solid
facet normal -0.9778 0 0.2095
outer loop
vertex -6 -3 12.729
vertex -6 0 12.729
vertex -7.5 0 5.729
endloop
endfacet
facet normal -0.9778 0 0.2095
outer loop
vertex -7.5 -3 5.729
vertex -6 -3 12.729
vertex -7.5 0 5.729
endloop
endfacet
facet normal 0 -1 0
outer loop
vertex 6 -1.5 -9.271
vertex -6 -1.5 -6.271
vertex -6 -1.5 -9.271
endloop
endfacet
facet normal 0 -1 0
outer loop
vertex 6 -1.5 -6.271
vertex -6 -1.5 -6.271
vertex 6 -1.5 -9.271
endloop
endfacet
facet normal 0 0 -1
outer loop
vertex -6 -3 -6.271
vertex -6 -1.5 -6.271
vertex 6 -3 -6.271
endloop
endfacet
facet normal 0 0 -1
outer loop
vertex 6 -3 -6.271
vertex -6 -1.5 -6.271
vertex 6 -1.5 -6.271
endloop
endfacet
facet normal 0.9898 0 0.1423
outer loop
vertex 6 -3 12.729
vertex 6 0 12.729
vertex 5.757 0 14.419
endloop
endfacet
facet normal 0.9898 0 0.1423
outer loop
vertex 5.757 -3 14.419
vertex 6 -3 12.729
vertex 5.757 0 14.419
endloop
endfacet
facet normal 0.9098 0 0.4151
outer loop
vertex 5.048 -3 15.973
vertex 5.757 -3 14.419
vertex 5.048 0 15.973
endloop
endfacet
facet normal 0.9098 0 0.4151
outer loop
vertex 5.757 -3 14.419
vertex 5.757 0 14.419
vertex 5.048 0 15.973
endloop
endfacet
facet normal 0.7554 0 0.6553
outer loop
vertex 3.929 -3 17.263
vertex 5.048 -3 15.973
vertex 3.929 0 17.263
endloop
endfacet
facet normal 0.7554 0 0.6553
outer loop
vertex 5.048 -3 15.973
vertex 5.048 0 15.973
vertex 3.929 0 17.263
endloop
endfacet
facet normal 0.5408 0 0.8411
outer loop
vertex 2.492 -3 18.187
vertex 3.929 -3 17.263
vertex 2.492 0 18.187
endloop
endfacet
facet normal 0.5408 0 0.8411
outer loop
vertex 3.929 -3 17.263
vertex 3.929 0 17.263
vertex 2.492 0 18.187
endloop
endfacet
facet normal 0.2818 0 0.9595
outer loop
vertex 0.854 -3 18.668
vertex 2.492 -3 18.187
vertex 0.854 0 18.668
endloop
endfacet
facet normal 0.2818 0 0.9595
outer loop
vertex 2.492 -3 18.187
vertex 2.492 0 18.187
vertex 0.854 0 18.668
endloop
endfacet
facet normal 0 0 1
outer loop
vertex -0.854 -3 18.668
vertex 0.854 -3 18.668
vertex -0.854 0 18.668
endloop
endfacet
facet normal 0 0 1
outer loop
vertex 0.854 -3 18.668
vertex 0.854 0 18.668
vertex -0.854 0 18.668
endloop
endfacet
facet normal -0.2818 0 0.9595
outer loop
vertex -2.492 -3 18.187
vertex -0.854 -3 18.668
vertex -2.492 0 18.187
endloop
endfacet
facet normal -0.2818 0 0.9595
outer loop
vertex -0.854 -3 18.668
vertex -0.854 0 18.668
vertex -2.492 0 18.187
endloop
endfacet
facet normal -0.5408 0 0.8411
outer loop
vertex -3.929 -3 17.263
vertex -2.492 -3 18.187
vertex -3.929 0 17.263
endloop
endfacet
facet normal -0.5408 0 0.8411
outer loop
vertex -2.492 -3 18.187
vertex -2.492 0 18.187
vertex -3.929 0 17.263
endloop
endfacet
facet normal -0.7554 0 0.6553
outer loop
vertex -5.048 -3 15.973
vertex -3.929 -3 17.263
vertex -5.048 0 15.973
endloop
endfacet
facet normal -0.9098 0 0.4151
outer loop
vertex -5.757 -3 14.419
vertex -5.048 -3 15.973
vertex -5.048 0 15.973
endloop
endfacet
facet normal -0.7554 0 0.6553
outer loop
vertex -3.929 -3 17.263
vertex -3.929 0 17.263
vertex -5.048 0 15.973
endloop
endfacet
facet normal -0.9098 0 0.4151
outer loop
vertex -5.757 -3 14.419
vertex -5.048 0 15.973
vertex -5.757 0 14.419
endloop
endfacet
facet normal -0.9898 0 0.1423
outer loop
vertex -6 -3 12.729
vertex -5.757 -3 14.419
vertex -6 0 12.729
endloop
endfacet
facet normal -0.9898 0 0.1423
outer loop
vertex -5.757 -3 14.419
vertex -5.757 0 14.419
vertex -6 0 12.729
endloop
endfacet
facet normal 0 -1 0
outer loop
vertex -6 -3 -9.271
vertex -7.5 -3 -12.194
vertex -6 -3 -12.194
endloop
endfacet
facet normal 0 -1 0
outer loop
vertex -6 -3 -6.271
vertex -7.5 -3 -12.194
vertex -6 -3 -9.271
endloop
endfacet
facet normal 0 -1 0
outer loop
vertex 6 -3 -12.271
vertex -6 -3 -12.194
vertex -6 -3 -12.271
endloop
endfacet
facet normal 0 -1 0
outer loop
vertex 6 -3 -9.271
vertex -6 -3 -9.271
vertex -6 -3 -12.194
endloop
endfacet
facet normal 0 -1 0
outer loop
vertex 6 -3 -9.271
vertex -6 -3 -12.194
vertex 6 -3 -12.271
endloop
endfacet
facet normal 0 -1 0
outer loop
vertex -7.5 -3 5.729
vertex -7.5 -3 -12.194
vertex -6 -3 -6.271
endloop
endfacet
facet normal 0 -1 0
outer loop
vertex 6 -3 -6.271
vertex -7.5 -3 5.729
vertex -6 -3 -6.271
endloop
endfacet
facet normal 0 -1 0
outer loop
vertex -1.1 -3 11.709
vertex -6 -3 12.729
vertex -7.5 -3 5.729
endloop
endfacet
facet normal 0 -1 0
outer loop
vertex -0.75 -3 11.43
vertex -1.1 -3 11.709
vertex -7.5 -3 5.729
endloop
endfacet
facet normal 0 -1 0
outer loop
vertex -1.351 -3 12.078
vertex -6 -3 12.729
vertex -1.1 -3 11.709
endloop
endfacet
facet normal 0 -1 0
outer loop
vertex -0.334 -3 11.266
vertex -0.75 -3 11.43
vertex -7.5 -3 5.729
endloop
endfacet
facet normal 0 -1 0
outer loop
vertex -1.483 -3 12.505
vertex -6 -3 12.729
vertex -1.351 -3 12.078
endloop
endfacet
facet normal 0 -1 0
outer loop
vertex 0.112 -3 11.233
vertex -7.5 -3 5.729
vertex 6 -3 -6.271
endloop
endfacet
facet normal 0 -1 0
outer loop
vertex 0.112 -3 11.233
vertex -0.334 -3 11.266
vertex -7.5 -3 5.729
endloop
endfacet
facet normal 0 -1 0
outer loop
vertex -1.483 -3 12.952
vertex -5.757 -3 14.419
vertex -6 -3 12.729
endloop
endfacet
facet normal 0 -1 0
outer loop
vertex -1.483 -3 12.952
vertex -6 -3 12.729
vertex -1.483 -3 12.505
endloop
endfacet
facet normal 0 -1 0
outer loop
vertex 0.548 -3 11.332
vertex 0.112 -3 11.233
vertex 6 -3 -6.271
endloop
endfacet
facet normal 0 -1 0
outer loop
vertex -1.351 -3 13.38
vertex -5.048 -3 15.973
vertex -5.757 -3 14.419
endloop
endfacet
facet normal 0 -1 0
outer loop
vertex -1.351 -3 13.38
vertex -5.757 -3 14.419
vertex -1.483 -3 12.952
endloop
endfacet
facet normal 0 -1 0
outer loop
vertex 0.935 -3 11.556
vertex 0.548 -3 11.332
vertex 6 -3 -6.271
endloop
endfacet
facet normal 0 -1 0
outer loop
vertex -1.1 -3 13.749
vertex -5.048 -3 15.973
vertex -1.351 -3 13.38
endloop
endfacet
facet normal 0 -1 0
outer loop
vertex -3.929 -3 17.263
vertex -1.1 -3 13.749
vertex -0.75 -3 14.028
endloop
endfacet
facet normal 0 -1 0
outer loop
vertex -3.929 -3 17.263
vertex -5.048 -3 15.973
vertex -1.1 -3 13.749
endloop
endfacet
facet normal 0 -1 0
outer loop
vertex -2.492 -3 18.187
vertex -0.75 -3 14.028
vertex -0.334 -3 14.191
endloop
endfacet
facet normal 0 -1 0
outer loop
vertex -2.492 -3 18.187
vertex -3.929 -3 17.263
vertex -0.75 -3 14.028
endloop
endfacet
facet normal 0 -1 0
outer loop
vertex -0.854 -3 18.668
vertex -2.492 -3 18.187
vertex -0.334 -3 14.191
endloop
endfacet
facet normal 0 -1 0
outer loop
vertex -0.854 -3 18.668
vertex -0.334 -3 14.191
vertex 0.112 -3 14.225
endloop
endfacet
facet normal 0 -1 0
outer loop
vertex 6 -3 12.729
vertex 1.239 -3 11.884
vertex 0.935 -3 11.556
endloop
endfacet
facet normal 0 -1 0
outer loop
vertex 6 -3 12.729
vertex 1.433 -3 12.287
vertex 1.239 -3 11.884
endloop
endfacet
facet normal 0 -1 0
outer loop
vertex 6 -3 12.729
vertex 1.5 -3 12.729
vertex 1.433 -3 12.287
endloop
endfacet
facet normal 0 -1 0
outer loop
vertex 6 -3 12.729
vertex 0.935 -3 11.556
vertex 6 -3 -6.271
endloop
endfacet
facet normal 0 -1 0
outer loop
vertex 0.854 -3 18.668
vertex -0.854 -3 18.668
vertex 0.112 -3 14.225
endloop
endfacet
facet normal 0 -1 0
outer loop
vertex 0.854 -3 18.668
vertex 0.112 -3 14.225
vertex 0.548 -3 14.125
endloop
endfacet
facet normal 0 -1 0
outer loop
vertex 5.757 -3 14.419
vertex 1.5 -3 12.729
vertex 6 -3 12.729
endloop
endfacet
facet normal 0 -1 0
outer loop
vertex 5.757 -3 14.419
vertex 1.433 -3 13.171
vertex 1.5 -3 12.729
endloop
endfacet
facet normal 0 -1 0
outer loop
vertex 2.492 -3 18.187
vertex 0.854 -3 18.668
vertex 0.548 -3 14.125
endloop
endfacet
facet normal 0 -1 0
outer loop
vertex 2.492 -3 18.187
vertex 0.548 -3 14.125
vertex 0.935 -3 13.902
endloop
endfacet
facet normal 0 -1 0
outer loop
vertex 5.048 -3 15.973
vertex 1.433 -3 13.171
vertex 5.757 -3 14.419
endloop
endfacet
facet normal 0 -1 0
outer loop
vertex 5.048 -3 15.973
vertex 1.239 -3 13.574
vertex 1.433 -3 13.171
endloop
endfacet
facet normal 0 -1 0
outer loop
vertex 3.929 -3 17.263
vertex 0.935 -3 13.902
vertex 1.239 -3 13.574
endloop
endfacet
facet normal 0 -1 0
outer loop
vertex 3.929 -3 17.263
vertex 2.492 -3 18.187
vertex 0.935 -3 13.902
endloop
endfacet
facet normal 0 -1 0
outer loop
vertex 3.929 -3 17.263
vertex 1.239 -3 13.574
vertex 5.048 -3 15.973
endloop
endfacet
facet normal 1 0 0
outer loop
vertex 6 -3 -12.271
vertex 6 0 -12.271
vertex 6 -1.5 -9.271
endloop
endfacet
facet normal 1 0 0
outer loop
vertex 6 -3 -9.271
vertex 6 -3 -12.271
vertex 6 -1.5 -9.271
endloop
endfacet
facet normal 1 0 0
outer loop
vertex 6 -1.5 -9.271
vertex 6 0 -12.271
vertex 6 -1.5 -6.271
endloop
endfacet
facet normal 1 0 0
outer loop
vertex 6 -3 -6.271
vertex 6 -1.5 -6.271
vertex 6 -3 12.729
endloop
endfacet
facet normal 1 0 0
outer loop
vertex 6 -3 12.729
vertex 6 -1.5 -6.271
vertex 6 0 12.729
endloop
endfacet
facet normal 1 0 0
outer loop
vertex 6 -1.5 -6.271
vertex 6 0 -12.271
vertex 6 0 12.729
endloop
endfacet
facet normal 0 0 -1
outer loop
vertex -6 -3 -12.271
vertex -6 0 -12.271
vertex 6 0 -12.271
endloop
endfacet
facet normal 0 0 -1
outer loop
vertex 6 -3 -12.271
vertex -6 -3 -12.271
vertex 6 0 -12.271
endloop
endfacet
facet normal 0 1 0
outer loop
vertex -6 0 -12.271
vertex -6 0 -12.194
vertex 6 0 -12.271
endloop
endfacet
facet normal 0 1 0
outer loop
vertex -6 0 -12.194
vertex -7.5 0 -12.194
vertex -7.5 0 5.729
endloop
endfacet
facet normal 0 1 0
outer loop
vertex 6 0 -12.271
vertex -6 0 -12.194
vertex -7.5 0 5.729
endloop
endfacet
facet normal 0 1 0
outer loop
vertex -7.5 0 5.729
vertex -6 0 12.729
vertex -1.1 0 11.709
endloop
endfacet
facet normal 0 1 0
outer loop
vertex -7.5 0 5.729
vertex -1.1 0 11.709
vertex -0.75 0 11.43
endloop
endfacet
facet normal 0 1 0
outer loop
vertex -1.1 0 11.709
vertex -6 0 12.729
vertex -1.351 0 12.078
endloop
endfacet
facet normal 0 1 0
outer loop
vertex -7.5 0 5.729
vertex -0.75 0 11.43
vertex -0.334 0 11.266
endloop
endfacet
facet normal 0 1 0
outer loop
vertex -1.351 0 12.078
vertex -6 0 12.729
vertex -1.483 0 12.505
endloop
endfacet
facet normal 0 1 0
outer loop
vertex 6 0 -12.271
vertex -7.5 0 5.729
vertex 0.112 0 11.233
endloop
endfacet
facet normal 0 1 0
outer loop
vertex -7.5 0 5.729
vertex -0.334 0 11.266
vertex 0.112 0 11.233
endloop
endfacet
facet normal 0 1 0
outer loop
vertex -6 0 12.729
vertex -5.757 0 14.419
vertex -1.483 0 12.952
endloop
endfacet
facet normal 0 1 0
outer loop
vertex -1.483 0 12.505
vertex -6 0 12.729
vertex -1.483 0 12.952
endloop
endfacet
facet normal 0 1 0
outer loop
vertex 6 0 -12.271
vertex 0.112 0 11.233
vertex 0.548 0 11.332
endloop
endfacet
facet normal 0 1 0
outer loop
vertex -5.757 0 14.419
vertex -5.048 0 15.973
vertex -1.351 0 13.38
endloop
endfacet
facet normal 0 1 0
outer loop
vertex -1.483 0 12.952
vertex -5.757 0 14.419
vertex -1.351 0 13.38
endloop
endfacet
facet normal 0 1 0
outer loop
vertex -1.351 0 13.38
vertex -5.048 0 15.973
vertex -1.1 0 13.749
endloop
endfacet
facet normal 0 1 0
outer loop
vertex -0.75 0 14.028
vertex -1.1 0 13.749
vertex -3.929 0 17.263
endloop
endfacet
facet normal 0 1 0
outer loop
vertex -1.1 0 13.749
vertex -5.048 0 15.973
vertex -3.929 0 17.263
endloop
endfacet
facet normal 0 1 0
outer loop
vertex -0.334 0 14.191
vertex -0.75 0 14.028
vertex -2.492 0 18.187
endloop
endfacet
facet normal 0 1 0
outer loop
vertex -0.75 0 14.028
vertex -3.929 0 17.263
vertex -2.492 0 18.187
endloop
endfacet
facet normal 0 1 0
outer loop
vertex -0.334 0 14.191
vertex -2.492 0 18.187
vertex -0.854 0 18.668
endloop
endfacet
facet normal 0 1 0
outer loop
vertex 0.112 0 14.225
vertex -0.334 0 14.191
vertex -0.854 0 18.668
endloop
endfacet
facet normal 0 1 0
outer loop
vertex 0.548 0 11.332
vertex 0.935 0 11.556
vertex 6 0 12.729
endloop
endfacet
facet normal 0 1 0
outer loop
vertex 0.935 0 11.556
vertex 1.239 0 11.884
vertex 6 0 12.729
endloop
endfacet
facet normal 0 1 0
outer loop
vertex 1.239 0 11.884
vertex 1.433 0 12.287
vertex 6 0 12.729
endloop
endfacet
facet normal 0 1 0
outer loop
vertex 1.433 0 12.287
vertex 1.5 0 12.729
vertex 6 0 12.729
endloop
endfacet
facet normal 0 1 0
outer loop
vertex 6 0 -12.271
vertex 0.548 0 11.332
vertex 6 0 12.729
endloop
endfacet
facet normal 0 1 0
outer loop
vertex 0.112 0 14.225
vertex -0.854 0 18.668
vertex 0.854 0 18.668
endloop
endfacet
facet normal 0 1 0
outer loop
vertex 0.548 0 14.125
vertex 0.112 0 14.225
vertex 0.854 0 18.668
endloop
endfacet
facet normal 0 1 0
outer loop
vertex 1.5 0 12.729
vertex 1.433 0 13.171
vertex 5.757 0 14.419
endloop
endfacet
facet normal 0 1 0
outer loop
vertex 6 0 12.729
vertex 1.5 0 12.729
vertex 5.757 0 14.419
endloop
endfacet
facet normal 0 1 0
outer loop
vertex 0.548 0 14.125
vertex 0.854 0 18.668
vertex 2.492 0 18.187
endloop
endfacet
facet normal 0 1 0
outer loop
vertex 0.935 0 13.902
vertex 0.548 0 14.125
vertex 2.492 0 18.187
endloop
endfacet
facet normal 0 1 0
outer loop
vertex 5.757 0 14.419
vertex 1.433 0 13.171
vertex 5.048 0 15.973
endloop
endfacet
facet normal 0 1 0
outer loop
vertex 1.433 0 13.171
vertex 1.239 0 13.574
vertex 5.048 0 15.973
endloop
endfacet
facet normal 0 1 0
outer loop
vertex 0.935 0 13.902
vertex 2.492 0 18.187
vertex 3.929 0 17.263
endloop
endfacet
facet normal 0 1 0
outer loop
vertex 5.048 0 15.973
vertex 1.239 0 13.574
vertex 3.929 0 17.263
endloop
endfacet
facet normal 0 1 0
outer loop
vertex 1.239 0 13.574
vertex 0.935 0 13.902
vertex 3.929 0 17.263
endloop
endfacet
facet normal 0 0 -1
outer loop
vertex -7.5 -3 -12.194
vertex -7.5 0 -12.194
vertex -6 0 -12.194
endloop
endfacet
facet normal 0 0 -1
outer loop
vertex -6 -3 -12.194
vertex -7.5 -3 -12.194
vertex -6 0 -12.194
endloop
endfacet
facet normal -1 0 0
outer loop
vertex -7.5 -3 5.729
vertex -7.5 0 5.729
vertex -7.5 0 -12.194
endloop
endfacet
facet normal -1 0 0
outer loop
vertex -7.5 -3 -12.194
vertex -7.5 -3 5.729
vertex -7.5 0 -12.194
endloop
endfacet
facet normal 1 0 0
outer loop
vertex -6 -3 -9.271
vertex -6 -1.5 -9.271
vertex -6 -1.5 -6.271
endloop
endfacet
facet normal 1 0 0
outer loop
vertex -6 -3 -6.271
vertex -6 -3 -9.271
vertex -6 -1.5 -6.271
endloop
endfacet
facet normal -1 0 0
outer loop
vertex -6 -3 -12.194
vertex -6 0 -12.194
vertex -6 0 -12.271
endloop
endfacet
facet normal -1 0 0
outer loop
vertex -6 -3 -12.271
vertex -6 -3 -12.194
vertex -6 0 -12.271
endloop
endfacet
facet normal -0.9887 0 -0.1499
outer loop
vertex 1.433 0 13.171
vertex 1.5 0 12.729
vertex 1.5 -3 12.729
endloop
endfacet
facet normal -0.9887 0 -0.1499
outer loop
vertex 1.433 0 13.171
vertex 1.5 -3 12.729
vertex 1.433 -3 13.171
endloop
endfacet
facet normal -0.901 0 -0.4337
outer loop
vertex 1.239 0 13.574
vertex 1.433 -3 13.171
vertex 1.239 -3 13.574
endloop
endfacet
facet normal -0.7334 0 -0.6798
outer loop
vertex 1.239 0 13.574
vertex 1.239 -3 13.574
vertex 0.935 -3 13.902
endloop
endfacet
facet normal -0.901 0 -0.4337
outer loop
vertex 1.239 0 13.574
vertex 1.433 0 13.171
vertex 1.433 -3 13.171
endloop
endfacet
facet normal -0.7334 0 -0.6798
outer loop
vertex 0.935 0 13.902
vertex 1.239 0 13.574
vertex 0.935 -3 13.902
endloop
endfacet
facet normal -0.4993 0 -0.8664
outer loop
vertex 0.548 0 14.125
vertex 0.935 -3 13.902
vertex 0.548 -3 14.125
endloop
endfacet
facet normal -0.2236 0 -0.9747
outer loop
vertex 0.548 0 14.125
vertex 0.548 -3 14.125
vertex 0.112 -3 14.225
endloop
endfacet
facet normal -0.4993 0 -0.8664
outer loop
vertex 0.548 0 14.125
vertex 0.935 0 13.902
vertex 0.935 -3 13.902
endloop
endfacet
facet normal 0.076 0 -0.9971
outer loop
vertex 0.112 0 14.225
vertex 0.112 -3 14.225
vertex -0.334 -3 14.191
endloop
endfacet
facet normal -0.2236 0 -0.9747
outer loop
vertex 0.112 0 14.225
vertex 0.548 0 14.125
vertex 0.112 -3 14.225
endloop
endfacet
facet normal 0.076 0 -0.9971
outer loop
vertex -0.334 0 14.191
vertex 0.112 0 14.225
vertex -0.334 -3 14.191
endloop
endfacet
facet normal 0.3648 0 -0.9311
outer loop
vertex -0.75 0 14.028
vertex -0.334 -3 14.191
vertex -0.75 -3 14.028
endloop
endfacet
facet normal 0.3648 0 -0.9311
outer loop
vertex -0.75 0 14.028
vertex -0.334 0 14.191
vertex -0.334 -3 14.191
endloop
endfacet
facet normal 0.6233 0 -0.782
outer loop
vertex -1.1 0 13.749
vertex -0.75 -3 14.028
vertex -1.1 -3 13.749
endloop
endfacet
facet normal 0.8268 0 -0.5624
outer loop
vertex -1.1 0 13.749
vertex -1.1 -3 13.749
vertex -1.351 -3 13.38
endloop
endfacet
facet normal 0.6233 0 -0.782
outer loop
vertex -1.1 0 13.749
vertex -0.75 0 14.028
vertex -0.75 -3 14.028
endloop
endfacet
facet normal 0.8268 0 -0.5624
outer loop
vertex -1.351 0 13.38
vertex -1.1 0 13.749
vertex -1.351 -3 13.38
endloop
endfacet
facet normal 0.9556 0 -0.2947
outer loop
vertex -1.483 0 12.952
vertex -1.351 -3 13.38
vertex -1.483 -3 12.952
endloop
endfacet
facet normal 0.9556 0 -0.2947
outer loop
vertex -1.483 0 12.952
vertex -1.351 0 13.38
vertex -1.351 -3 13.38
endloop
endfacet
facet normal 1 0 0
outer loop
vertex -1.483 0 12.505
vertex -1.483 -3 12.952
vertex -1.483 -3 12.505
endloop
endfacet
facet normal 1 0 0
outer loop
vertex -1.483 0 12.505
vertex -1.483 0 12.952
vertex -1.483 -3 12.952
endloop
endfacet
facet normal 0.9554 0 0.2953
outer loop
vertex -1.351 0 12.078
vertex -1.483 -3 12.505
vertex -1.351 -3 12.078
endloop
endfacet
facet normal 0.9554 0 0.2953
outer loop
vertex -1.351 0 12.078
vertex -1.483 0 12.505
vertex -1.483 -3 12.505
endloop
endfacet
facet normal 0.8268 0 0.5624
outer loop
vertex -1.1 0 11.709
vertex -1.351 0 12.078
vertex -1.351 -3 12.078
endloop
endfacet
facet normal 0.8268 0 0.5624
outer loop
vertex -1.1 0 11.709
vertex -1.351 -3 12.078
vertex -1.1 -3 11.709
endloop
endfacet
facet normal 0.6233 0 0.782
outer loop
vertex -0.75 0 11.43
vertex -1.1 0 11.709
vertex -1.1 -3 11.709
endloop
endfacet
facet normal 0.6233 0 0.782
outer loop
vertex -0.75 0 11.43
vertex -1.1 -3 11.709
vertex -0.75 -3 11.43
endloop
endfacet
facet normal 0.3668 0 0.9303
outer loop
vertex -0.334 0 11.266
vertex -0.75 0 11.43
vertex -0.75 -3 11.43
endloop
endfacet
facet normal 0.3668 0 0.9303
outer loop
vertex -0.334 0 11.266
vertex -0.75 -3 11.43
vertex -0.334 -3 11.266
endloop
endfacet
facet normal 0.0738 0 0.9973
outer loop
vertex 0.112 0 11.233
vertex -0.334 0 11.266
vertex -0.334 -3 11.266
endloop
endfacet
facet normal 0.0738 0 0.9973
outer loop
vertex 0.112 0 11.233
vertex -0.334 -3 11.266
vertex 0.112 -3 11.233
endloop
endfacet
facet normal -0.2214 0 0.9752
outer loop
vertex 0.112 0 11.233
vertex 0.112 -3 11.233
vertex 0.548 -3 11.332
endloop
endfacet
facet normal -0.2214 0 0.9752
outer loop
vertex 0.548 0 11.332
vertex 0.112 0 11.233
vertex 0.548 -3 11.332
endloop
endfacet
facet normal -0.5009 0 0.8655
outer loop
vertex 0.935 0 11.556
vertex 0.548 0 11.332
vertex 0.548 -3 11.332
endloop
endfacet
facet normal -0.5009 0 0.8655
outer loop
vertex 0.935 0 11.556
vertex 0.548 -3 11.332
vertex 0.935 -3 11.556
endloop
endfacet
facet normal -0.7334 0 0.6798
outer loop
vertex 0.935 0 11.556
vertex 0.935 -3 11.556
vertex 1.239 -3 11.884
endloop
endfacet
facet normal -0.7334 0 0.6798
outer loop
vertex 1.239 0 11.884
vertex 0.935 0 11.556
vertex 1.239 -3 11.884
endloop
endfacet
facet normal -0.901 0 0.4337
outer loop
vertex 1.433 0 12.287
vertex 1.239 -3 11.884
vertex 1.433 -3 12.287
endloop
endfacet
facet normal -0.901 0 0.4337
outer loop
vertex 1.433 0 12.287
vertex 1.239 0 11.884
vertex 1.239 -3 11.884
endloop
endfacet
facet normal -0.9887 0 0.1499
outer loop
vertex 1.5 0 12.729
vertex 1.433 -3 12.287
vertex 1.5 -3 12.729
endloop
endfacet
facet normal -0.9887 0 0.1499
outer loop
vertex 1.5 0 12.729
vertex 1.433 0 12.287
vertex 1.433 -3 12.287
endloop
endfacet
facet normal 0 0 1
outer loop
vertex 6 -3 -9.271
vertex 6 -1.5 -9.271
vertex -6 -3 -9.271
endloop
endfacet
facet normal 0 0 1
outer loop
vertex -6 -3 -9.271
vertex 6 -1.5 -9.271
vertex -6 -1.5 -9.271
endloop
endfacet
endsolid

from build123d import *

# Parameters (mm, degrees)
F0_R     = 1.5
F1_DEPTH = 3
F2_DEPTH = 1.5


with BuildPart() as f1:
    # F0 (on Front) → F1 (new body)
    with BuildSketch(Plane.XZ):
        with BuildLine():
            Line((-6, -9.2712371871), (-6, -6.2712371871))
            Line((-6, -6.2712371871), (0, -6.2712371871))
            Line((0, -6.2712371871), (6, -6.2712371871))
            Line((6, -6.2712371871), (6, 0))
            Line((6, 0), (6, 12.7287628129))
            ThreePointArc((6, 12.7287628129), (0, 18.7287628129), (-6, 12.7287628129))
            Line((-6, 12.7287628129), (-7.5, 5.7287628129))
            Line((-7.5, 5.7287628129), (-7.5, -6.2712371871))
            Line((-7.5, -6.2712371871), (-7.5, -12.1941817924))
            Line((-7.5, -12.1941817924), (-6, -12.1941817924))
            Line((-6, -12.1941817924), (-6, -12.2712371871))
            Line((-6, -12.2712371871), (0, -12.2712371871))
            Line((0, -12.2712371871), (6, -12.2712371871))
            Line((6, -12.2712371871), (6, -9.2712371871))
            Line((6, -9.2712371871), (0, -9.2712371871))
            Line((0, -9.2712371871), (-6, -9.2712371871))
        make_face()
        with Locations((0, 12.7287628129)):
            Circle(F0_R, mode=Mode.SUBTRACT)
    extrude(amount=F1_DEPTH)

    # F0 (on Front) → F2 (join)
    with BuildSketch(Plane.XZ):
        Polygon((0, -6.2712371871), (-6, -6.2712371871), (-6, -9.2712371871), (0, -9.2712371871), (6, -9.2712371871), (6, -6.2712371871), align=None)
    extrude(amount=F2_DEPTH)


solid = f1.part
